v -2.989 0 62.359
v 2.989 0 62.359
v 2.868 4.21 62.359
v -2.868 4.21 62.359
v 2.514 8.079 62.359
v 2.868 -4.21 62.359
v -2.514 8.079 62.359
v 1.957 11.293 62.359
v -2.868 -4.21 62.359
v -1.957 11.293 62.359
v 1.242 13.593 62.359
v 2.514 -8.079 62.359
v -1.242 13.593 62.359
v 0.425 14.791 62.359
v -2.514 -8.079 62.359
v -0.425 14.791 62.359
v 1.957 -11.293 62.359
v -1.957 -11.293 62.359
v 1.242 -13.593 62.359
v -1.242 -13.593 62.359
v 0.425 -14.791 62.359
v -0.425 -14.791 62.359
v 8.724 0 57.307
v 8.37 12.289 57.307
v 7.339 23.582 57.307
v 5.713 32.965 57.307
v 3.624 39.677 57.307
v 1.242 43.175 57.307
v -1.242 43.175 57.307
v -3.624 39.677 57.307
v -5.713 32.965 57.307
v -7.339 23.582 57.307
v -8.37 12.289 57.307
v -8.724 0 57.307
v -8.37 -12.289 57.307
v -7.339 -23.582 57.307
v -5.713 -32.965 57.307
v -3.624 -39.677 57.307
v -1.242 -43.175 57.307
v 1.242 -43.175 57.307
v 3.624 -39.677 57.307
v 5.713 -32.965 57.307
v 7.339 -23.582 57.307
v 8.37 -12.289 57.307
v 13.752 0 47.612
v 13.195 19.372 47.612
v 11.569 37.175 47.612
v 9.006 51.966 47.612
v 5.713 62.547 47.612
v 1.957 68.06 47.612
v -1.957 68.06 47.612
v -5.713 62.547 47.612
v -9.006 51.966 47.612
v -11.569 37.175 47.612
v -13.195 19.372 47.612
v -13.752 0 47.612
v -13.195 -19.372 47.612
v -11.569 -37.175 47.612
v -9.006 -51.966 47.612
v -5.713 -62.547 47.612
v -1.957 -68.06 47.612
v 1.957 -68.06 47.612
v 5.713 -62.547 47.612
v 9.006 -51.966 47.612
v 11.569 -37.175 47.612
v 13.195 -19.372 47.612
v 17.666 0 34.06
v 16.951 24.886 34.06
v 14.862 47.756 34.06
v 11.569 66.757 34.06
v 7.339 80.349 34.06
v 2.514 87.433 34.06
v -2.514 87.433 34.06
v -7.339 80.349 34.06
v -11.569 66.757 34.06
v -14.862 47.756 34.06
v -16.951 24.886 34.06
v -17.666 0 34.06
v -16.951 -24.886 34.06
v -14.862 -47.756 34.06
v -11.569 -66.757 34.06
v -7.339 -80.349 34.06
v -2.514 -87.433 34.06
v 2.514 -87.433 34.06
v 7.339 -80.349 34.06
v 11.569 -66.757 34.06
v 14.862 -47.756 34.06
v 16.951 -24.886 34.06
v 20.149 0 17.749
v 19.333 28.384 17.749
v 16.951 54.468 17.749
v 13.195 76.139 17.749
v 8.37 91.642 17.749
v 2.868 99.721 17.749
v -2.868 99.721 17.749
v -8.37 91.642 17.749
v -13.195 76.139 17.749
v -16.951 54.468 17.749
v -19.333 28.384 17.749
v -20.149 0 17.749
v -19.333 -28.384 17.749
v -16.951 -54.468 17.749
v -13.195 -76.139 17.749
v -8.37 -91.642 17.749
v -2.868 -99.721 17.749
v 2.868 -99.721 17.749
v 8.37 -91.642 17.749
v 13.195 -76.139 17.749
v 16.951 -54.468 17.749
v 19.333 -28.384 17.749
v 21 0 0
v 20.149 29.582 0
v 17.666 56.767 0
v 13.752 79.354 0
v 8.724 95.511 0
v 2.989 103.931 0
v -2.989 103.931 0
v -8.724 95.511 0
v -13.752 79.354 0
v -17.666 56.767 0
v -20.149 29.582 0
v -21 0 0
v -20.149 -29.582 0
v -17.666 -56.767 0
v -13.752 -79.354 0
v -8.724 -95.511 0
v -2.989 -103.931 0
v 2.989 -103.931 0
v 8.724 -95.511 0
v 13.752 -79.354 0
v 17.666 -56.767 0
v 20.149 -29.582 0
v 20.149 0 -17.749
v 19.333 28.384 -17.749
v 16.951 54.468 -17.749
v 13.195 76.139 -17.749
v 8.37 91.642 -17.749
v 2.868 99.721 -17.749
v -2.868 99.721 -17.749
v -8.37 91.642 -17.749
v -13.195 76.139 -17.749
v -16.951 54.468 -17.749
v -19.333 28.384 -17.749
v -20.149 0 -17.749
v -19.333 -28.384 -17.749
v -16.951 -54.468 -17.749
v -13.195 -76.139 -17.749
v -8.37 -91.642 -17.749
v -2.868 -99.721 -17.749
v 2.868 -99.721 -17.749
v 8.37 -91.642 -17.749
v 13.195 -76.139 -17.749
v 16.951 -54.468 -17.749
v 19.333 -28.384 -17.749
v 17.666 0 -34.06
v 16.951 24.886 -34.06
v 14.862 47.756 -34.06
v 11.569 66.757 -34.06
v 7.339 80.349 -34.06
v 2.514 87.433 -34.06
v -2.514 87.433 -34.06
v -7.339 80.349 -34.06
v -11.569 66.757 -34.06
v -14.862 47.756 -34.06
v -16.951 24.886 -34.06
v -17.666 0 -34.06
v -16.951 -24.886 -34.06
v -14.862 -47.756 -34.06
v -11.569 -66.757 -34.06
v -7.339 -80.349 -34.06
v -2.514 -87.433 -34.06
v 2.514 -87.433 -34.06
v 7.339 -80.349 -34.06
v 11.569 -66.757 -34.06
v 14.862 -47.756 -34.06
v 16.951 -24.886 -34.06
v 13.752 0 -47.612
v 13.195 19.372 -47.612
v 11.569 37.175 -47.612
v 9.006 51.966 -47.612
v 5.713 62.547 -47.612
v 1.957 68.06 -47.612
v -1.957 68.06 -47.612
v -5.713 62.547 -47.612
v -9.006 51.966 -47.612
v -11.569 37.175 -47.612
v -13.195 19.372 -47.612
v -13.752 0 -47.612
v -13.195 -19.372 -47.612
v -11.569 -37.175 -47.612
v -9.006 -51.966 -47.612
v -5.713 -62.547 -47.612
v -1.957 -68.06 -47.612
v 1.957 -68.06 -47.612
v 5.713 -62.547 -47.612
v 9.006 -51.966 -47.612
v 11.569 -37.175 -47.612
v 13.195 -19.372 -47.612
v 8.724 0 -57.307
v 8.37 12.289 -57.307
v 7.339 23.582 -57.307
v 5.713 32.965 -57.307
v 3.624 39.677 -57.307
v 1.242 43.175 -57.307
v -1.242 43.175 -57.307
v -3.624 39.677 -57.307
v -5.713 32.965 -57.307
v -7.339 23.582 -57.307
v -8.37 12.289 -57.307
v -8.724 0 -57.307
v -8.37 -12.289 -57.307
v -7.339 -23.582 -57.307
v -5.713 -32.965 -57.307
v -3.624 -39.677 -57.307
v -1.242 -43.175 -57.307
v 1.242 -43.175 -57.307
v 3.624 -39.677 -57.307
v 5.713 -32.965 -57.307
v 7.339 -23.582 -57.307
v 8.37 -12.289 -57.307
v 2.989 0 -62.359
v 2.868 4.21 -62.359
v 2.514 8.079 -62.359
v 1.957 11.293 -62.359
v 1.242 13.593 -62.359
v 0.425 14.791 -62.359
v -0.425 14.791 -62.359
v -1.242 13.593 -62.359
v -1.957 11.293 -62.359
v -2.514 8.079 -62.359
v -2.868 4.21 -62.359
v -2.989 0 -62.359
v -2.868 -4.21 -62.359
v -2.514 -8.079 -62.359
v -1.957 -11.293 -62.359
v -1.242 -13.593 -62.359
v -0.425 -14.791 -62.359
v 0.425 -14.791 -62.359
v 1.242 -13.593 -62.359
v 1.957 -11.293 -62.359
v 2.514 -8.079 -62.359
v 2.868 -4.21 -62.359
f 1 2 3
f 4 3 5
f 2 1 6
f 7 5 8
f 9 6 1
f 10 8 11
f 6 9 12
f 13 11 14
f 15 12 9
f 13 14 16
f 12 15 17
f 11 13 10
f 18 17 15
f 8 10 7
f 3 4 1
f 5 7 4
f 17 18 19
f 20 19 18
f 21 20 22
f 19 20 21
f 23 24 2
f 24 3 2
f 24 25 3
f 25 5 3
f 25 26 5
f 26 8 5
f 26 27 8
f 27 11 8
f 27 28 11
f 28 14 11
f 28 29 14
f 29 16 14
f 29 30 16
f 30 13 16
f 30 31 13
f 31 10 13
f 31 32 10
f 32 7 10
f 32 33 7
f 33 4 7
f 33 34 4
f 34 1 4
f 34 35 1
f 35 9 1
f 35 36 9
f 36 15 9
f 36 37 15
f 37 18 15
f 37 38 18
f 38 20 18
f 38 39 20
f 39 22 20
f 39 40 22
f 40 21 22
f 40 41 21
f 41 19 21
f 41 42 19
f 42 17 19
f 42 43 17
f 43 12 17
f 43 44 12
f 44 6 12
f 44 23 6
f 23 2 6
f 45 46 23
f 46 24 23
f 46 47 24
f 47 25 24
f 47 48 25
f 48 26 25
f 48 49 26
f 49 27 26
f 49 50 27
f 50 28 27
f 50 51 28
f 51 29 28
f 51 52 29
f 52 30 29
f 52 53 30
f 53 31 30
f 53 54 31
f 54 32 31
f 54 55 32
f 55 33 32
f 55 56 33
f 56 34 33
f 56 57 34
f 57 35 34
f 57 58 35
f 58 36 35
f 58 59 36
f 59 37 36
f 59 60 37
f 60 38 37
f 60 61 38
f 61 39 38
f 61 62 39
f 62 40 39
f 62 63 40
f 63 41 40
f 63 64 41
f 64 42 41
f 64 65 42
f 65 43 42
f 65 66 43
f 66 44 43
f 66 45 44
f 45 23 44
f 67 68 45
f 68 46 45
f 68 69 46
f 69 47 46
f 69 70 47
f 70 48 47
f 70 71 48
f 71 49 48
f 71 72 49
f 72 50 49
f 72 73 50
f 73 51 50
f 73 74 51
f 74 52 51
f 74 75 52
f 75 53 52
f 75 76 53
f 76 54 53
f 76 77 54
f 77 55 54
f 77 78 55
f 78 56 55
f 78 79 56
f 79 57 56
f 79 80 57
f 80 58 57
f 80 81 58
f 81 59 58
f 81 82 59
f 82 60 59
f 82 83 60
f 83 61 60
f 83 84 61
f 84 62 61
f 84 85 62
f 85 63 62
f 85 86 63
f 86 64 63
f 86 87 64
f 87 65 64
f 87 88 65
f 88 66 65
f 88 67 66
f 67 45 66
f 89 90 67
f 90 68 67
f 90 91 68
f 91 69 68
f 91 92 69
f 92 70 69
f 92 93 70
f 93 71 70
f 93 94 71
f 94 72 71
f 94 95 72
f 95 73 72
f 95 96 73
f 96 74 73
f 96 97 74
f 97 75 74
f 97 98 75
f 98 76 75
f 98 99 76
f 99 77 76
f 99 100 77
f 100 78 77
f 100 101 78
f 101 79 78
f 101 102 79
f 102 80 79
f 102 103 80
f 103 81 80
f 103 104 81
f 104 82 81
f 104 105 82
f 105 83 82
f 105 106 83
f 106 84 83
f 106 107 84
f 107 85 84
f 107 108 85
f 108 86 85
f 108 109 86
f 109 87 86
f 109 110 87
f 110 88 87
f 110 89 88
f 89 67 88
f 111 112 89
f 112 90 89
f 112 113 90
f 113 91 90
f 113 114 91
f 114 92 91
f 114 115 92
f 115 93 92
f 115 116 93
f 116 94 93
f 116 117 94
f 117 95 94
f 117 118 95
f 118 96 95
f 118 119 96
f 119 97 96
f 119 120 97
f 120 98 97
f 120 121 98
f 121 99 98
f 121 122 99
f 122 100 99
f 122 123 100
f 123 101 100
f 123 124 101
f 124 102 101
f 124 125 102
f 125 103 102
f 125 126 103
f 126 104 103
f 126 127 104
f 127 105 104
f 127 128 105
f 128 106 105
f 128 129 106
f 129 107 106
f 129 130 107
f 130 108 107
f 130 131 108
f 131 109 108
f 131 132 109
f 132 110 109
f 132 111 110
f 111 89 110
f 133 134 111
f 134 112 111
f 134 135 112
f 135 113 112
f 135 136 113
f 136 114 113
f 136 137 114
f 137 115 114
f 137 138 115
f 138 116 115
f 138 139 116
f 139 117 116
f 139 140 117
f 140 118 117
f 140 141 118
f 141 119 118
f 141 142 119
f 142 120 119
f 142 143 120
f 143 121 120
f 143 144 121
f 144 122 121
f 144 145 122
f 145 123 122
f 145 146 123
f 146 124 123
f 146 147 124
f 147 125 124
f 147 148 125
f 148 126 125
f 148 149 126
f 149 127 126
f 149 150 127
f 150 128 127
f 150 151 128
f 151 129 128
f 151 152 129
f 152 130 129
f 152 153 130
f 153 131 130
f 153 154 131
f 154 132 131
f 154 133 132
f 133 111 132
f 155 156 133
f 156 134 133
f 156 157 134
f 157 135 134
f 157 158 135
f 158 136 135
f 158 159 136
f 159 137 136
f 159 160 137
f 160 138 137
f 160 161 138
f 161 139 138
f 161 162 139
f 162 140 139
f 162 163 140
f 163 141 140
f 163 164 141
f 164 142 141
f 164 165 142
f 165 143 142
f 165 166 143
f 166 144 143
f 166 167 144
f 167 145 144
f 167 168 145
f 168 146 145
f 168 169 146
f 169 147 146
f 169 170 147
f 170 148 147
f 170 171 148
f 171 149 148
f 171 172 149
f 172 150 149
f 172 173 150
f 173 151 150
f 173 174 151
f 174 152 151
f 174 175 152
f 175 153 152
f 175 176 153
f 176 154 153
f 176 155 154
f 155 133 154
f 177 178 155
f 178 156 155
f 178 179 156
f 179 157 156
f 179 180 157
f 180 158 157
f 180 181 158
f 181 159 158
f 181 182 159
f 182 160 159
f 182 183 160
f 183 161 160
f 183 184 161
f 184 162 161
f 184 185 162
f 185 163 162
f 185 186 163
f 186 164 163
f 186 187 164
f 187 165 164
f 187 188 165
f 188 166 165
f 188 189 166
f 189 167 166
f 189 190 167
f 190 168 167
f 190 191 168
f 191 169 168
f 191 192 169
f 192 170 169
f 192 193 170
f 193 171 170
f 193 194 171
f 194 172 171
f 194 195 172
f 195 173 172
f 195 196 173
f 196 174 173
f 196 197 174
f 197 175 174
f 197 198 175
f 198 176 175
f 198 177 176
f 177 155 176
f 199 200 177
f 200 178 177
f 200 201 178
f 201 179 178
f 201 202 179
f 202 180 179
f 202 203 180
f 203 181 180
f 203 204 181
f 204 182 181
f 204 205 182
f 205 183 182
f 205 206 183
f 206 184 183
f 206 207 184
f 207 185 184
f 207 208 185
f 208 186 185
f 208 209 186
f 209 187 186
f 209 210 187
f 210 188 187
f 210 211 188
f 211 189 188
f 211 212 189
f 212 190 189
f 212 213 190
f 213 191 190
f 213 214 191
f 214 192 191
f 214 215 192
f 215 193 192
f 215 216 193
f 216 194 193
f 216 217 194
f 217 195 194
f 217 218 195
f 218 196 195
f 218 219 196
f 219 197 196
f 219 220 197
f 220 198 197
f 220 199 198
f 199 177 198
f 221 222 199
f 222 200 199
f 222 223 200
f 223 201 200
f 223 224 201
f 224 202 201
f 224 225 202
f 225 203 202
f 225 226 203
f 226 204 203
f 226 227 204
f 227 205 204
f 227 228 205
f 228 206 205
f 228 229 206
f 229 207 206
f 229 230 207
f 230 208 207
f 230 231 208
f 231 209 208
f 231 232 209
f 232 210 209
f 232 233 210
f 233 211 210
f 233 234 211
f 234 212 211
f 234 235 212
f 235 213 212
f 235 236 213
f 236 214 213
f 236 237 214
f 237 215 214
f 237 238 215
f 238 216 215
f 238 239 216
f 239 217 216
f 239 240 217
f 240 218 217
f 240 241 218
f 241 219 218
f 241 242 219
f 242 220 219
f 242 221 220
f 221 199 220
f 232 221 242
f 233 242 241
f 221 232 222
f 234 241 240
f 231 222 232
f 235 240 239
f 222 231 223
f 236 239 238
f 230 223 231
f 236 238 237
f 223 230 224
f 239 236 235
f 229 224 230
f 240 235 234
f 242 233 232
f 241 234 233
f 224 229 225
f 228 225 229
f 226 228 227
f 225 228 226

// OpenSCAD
// Generated by SolidPython 1.0.1 on 2020-07-29 00:46:45


scale(v = [3, 15, 9]) {
	sphere(r = 7);
}
/***********************************************
*********      SolidPython code:      **********
************************************************
 
# import packages: SolidPython
from solid import *
from solid.utils import *
from itertools import chain, combinations, permutations


class Resize:

    def __init__(self, scad_file):
        self.scad_file = scad_file
        #self.scad_file = import_scad(scad_file)
        # cone/cylinder param:
        self.r1 = 0
        self.r2 = 0
        self.h = 0
        # rectangular prism param:
        self.w = 0
        self.l = 0
        # ellipse param:
        self.r = 0

    # import OpenScad code (file name corresponds to shape)


    # classify shape + parameters
    def assign(self, param1, param2, param3):
        if self.scad_file == 'cone.scad':
            self.r1 = param1
            self.r2 = param2
            self.h = param3
        elif self.scad_file == 'cylinder.scad':
            self.r1 = param1
            self.r2 = param2
            self.h = param3
        elif self.scad_file == 'rectangularPrism.scad':
            self.h = param1
            self.l = param2
            self.w = param3
        else:
            self.r = param1
            self.h = param2

    # resize parameters
    def iterate(self):
        x = range(3, 20, 2)
        i = 1
        if self.scad_file == 'cone.scad':
            tempList = list(permutations(x, 2))
            for temp in tempList:
                param1 = temp[0]
                param2 = temp[1]
                filepath = 'produced_scad_files/' + 'cone' + str(param1) + '_' + str(param2) + '_' + '.scad'
                scad_render_to_file(cylinder(h=param1, r1=param2, r2=0), filepath)

        elif self.scad_file == 'cylinder.scad':
            tempList = list(permutations(x, 3))
            for temp in tempList:
                param1 = temp[0]
                param2 = temp[1]
                filepath = 'produced_scad_files/' + 'cylinder' + str(param1) + '_' + str(param2) + '_' + '.scad'
                scad_render_to_file(cylinder(h=param1, r1=param2, r2=param2), filepath)

        elif self.scad_file == 'rectangularPrism.scad':
            tempList = list(permutations(x, 3))
            for temp in tempList:
                param1 = temp[0]
                param2 = temp[1]
                param3 = temp[2]
                filepath = 'produced_scad_files/' + 'rectangularPrism' + str(param1) + '_' + str(param2) + '_' + str(
                    param3) + '.scad'
                scad_render_to_file(cube(size=(param1, param2, param3)), filepath)

        elif self.scad_file == 'ellipse.scad':
            tempList = list(permutations(x, 4))
            for temp in tempList:
                param1 = temp[0]
                param2 = temp[1]
                param3 = temp[2]
                param4 = temp[3]
                filepath = 'produced_scad_files/' + 'ellipse' + str(param1) + '_' + str(param2) + '_' + str(param3) + '_' + str(param4) + '.scad'
                scad_render_to_file(scale([param1, param2, param3])(sphere(r=param4)), filepath)

    def render_to_scadfile(self):
        scad_render_to_file(scad, 'example.scad') 
 
************************************************/
